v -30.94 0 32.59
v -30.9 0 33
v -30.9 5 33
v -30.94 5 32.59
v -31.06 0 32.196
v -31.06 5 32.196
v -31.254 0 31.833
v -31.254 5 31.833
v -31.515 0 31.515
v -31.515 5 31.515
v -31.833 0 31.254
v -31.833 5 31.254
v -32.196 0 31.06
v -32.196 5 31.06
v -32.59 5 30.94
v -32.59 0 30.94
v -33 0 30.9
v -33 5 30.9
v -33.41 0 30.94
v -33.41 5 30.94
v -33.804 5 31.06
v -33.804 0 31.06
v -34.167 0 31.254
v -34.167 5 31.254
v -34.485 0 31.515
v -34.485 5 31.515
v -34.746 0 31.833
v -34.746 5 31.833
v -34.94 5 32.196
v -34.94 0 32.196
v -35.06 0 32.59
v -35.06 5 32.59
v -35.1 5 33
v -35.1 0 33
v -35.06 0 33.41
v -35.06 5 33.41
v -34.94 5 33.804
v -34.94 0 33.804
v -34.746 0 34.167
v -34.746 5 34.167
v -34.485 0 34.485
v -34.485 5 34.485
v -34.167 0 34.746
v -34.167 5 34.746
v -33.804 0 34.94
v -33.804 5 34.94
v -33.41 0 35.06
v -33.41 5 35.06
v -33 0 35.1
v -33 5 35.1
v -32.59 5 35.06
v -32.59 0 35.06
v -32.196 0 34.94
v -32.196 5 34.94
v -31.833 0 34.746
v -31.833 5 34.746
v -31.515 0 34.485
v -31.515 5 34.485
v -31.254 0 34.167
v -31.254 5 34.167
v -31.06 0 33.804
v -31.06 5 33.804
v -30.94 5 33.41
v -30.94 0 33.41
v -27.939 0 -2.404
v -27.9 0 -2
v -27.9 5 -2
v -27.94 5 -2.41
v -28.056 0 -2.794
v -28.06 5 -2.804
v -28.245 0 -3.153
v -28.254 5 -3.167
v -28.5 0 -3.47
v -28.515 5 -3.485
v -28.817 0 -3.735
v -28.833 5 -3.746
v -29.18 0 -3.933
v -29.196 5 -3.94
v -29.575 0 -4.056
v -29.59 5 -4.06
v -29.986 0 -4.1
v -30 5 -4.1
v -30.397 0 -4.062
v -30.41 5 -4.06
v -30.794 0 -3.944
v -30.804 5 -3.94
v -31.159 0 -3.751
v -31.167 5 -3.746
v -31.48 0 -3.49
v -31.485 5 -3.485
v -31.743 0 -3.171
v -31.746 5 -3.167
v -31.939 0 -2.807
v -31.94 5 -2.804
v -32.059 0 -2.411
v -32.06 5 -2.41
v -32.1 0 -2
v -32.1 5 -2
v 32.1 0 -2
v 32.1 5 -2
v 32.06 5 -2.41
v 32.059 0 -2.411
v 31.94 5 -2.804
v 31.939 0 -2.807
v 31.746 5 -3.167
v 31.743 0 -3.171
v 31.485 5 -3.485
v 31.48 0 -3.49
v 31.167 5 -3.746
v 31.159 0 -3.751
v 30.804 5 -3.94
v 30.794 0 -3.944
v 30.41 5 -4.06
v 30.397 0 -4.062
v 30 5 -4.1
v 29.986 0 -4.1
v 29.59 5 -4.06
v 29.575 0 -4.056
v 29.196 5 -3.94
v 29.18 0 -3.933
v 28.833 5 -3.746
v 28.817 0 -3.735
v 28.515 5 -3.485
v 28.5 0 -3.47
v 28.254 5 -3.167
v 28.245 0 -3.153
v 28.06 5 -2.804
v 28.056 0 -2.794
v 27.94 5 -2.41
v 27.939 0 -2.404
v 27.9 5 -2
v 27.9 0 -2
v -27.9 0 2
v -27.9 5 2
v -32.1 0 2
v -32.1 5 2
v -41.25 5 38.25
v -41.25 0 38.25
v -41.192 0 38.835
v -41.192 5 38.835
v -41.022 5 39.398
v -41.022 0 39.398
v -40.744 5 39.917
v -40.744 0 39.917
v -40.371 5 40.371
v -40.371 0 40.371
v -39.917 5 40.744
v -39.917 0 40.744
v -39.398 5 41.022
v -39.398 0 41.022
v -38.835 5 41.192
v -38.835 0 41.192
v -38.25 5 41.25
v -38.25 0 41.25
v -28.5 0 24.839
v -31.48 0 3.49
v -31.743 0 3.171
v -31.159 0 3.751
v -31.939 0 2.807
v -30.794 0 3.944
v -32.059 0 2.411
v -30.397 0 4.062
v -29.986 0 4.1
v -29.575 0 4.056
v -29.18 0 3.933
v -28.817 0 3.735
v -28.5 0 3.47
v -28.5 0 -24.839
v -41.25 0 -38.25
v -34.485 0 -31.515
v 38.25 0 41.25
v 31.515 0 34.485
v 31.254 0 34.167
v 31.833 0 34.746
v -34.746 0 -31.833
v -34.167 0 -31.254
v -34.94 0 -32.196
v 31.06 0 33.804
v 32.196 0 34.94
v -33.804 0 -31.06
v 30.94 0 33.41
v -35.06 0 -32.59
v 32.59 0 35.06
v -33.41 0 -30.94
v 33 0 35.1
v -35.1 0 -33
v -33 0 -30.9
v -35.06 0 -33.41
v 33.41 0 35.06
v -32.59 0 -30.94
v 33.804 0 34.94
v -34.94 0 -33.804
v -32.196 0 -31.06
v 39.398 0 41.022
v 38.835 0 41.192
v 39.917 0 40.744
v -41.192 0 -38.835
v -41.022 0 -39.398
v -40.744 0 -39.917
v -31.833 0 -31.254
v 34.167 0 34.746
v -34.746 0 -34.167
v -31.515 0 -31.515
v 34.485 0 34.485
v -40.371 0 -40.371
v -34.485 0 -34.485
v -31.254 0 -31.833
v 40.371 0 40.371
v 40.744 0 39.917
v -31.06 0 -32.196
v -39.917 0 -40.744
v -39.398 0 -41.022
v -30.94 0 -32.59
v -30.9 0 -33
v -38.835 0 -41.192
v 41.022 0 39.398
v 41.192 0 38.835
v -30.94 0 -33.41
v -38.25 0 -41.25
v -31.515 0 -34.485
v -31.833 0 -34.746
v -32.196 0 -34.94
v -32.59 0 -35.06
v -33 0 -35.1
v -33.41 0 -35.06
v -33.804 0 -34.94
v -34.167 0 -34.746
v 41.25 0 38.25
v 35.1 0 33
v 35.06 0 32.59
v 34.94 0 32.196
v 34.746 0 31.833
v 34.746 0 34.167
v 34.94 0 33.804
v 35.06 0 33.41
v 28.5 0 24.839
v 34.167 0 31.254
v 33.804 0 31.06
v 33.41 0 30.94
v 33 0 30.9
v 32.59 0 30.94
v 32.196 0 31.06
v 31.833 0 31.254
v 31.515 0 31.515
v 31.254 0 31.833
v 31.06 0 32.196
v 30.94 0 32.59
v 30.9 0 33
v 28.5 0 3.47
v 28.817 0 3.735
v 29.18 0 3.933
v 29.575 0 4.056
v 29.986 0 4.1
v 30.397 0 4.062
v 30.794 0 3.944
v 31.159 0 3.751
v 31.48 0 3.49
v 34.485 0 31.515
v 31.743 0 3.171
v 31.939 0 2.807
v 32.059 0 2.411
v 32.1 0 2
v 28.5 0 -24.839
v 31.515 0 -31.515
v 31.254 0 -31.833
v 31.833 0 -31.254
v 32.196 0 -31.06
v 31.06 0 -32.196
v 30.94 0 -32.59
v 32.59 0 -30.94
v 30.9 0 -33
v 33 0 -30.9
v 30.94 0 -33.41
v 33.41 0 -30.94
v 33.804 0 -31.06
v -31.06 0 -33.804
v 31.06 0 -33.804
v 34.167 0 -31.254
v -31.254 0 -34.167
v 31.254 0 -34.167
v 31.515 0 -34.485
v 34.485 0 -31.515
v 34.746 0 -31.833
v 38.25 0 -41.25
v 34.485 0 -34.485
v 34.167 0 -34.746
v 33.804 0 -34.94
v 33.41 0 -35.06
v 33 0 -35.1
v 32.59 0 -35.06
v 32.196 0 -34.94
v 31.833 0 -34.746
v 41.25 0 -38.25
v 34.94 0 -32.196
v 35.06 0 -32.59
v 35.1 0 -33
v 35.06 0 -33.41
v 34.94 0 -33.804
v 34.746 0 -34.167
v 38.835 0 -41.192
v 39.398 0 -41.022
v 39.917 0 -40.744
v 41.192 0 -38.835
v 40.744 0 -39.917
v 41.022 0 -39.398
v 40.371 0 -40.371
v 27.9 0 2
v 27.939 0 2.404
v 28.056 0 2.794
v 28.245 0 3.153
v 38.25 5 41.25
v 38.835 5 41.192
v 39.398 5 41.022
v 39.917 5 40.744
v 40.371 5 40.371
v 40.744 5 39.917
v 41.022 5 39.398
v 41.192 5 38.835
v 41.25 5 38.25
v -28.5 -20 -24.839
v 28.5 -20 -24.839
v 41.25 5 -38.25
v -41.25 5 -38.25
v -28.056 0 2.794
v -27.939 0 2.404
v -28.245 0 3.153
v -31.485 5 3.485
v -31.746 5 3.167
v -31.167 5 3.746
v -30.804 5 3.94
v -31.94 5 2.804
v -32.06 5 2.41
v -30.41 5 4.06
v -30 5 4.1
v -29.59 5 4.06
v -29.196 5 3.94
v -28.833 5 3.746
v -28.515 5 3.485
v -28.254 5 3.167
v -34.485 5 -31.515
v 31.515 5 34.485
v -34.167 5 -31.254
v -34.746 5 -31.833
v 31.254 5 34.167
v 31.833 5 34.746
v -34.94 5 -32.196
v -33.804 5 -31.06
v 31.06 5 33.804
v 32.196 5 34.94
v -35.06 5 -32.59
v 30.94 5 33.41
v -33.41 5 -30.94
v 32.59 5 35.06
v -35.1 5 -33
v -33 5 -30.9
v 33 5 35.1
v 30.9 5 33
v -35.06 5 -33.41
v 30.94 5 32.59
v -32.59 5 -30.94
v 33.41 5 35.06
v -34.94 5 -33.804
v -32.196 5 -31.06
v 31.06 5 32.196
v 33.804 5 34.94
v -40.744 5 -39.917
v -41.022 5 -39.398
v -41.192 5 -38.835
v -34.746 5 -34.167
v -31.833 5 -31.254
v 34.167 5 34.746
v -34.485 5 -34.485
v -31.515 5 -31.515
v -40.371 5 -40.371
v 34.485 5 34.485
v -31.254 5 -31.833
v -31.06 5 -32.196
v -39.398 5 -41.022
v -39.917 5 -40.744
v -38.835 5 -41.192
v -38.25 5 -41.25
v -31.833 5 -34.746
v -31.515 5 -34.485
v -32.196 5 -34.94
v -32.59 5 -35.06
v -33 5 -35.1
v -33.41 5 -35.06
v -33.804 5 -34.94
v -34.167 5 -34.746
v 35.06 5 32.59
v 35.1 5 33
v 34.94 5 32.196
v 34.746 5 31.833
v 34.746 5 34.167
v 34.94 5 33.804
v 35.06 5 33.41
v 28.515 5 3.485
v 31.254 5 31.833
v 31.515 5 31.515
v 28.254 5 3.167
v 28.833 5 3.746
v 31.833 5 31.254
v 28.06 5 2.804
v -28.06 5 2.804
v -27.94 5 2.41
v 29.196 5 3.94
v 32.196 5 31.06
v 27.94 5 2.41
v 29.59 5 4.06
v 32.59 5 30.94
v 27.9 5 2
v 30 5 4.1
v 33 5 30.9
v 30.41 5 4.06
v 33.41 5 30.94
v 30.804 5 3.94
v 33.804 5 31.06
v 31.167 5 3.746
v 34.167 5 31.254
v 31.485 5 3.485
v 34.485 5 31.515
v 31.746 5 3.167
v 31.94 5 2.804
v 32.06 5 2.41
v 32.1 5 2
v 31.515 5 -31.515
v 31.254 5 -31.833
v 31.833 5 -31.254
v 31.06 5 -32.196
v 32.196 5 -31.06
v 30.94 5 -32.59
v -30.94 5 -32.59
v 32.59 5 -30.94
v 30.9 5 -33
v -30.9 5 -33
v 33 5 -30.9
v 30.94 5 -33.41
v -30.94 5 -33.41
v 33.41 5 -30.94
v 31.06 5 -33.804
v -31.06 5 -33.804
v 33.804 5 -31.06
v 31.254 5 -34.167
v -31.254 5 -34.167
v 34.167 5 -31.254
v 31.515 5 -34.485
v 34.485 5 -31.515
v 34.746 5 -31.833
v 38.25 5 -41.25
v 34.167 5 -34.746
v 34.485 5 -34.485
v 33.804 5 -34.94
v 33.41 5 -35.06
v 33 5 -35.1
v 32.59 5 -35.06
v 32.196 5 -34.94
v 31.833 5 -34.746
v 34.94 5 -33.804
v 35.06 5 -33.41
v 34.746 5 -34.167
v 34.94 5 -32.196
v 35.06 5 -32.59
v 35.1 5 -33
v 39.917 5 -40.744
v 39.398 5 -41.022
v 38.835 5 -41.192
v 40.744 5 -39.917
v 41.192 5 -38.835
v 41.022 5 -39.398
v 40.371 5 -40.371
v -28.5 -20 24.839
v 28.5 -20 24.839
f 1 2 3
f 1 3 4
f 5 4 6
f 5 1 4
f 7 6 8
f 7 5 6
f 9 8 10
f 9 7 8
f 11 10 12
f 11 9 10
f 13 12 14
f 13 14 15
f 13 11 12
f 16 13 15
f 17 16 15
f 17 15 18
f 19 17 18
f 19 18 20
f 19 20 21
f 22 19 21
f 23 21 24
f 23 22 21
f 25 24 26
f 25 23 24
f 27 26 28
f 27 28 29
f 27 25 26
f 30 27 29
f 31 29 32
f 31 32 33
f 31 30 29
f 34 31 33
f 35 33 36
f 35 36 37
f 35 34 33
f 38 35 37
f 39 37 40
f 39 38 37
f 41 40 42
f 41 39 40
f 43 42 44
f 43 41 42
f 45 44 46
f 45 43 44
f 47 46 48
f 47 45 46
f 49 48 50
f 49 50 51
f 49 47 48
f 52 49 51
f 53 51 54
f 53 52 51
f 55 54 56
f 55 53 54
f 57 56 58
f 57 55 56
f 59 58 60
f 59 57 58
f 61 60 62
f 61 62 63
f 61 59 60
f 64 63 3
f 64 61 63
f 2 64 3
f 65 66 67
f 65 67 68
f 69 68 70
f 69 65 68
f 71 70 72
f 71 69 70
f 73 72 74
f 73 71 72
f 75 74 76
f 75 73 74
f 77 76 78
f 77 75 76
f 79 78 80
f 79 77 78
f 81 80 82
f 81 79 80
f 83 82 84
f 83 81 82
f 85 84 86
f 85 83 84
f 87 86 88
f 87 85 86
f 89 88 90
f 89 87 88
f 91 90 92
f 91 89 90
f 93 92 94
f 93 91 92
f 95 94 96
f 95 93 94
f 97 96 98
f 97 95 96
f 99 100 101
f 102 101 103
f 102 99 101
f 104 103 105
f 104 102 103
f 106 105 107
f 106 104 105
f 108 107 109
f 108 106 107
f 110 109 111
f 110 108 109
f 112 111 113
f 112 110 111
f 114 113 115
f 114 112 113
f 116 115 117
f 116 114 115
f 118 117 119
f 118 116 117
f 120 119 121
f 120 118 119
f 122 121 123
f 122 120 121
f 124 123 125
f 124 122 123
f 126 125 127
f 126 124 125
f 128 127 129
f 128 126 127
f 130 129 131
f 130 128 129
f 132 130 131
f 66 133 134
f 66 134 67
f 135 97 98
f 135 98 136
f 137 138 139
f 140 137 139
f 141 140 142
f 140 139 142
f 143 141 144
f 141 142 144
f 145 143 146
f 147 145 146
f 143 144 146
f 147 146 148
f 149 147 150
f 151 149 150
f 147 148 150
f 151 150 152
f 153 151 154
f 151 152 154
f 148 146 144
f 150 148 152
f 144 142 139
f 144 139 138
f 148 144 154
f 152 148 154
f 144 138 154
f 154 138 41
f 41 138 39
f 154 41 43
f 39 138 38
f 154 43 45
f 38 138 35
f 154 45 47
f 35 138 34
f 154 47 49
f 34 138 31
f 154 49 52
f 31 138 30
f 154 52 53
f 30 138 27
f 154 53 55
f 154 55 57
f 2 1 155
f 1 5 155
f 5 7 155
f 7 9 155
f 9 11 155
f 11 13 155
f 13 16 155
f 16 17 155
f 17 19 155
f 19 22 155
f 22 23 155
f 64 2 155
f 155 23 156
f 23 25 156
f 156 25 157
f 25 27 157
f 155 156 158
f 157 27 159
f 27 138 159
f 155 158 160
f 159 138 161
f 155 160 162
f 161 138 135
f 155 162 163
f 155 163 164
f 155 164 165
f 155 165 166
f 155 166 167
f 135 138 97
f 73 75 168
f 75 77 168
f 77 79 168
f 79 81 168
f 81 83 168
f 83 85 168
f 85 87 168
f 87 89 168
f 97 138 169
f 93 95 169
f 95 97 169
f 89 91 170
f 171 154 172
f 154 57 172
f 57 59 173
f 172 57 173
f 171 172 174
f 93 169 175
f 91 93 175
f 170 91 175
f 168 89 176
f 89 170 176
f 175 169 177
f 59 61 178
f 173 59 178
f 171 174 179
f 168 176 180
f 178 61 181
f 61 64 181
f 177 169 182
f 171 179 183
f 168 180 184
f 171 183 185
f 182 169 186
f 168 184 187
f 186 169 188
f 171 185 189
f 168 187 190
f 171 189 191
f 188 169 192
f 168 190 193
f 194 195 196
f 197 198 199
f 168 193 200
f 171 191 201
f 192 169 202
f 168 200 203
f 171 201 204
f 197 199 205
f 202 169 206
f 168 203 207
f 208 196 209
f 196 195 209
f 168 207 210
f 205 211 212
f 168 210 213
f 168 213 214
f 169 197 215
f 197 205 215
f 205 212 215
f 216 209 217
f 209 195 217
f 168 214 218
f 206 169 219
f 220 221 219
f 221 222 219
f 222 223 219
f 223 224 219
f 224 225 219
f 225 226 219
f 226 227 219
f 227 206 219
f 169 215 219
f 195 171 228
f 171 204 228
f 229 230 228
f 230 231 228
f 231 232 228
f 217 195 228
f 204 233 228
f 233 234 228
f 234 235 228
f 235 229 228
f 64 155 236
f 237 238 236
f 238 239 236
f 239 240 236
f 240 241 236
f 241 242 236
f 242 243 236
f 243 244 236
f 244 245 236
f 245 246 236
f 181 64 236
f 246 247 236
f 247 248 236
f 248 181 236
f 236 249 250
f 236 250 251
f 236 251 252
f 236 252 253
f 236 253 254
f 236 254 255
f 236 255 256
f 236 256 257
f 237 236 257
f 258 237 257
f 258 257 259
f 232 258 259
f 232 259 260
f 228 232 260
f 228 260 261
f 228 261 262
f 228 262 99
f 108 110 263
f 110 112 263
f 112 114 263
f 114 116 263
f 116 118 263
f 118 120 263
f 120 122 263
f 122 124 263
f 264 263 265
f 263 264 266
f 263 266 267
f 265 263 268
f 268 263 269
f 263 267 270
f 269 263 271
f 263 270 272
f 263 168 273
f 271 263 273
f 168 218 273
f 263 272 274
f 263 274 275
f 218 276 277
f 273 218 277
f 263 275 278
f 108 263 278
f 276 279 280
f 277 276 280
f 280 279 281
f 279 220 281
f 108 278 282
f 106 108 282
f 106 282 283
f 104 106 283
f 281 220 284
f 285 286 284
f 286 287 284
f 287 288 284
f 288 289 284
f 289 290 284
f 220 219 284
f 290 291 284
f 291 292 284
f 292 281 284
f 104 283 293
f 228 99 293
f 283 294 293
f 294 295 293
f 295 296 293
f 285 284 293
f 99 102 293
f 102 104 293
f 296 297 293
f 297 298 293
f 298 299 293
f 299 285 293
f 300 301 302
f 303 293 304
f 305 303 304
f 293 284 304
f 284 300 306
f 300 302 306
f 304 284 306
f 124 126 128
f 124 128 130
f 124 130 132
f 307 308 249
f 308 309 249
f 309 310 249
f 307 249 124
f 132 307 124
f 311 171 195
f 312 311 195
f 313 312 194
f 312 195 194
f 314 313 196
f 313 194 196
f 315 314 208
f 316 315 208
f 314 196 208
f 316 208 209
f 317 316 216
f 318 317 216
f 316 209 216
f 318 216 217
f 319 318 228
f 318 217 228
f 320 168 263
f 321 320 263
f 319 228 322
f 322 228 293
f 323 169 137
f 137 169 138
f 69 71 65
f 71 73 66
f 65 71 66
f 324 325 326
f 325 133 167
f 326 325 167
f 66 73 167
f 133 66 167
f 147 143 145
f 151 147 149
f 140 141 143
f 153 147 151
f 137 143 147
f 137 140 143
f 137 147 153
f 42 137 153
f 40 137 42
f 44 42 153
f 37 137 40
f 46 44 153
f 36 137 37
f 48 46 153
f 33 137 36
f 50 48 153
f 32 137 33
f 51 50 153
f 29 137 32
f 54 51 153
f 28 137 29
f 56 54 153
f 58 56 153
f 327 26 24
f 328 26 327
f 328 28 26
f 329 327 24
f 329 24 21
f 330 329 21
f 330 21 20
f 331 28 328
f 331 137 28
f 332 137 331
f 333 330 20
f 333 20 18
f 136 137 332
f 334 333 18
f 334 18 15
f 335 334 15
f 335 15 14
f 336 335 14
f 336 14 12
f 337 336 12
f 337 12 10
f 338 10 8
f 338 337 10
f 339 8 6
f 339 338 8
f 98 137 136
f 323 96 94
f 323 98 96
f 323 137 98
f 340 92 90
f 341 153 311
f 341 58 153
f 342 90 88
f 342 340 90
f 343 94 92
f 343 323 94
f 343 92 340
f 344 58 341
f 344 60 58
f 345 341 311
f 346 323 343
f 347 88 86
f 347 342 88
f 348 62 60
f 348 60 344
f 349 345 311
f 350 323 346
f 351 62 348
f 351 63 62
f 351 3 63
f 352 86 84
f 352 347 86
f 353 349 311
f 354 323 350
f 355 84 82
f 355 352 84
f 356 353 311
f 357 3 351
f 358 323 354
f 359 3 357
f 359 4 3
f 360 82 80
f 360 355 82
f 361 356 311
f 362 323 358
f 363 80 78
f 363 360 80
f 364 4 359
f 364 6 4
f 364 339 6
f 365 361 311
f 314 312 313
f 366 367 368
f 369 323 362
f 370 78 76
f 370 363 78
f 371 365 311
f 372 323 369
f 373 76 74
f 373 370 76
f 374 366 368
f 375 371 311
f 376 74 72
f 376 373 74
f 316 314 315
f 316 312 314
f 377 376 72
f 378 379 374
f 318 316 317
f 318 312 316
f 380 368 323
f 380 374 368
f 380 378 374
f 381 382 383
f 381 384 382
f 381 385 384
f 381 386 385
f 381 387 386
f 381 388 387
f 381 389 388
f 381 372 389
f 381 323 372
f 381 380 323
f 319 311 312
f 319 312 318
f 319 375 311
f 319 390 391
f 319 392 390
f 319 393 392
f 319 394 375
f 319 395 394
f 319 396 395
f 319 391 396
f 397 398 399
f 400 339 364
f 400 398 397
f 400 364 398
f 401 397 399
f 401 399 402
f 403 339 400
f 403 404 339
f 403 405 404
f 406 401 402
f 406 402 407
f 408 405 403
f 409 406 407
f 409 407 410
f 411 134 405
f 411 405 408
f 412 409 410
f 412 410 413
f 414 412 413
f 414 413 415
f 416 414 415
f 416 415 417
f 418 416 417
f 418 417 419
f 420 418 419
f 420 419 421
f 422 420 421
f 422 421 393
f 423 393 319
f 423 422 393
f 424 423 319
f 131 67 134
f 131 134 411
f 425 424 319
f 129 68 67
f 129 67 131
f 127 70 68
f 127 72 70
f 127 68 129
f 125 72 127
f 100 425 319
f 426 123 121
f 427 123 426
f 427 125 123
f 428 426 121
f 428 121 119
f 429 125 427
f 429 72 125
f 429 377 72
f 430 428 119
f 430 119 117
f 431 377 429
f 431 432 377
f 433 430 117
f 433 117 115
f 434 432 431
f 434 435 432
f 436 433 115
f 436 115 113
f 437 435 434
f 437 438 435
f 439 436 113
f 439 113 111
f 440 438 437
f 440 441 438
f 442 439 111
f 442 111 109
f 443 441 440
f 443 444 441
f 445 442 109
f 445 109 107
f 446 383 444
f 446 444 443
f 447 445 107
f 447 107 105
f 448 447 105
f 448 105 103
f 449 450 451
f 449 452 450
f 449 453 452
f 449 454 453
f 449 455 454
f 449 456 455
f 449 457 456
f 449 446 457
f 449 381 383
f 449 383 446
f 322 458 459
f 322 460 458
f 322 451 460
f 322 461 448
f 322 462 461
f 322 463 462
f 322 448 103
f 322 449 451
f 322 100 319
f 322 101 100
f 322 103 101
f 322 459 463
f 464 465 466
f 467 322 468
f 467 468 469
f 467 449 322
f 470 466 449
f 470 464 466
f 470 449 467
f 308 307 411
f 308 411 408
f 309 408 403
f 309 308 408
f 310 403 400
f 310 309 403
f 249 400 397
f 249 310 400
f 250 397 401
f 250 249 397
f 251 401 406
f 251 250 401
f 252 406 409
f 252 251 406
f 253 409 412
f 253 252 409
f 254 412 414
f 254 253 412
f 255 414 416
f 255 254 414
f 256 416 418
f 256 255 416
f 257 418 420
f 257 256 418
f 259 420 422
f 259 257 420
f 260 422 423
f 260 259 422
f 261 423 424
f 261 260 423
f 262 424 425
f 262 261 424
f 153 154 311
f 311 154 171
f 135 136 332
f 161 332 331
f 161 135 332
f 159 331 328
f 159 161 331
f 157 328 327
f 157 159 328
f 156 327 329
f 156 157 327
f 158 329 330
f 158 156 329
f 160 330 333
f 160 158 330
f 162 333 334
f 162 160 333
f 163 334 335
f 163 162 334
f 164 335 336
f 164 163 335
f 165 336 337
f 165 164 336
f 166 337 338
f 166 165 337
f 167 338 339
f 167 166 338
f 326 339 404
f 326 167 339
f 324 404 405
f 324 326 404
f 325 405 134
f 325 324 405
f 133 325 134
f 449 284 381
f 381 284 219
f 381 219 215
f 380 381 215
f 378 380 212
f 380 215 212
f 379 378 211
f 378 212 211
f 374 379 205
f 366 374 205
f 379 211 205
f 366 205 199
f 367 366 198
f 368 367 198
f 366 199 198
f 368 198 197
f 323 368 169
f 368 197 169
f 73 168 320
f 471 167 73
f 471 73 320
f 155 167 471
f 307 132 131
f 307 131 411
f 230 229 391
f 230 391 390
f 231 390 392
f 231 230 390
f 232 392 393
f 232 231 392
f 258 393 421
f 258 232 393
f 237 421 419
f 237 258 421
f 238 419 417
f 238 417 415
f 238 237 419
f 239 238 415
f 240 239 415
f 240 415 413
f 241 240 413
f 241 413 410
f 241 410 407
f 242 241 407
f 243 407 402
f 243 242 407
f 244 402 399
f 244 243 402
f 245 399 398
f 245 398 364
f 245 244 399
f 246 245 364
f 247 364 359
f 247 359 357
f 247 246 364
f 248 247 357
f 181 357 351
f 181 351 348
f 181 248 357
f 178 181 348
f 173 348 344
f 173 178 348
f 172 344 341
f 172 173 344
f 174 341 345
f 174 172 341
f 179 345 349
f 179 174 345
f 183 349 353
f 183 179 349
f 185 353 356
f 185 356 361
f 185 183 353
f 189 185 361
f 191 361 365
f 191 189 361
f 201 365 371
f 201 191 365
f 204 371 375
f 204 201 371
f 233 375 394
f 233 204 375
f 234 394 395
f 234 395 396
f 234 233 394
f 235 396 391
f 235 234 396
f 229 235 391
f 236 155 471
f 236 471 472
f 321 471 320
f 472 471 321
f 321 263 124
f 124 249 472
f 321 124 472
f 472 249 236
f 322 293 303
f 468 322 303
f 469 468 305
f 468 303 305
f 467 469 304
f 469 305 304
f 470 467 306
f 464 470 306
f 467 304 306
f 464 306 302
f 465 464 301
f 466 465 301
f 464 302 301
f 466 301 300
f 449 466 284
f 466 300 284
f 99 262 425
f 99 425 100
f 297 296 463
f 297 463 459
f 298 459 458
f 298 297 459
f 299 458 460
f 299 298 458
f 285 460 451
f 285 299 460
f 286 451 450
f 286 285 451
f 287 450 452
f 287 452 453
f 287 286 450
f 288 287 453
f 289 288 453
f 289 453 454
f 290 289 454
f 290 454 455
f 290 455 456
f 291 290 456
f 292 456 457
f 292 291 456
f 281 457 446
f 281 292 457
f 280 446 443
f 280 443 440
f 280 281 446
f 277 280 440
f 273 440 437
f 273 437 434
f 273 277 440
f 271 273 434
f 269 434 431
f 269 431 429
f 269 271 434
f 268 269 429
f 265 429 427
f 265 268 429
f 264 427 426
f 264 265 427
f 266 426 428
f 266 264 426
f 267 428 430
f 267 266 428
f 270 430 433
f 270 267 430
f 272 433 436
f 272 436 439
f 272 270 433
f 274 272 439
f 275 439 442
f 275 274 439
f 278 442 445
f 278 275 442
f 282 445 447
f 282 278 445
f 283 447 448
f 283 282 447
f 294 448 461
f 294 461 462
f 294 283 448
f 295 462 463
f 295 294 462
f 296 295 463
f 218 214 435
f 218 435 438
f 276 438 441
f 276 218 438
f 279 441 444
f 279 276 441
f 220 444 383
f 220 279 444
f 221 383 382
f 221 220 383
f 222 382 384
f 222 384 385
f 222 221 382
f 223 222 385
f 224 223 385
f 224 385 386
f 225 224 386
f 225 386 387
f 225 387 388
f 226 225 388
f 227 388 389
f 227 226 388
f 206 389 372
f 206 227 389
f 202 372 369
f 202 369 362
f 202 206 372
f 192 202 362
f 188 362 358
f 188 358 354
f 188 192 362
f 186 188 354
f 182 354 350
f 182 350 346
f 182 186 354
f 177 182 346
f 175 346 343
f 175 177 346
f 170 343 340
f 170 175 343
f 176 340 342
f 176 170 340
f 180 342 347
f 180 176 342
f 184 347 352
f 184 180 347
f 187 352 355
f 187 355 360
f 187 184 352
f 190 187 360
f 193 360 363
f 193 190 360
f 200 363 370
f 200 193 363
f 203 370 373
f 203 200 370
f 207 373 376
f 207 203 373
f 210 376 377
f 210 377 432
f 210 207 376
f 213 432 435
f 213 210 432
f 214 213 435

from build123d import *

# Parameters (mm, degrees)
SKETCH_1_R      = 2.1
EXTRUDE_1_DEPTH = 5
SKETCH_2_W      = 57
SKETCH_2_H      = 49.677447992
EXTRUDE_2_DEPTH = 20


with BuildPart() as part:
    # Эскиз1 → Бобышка-Вытянуть1 (new body)
    with BuildSketch(Plane(origin=(0, 0, 0), x_dir=(1, 0, 0), z_dir=(0, 1, 0))):
        with BuildLine():
            Line((-38.25, -41.25), (38.25, -41.25))
            ThreePointArc((38.25, -41.25), (40.371320344, -40.371320344), (41.25, -38.25))
            Line((41.25, -38.25), (41.25, 38.25))
            ThreePointArc((41.25, 38.25), (40.371320344, 40.371320344), (38.25, 41.25))
            Line((38.25, 41.25), (-38.25, 41.25))
            ThreePointArc((-38.25, 41.25), (-40.371320344, 40.371320344), (-41.25, 38.25))
            Line((-41.25, 38.25), (-41.25, -38.25))
            ThreePointArc((-41.25, -38.25), (-40.371320344, -40.371320344), (-38.25, -41.25))
        make_face()
        with Locations((-33, 33)):
            Circle(SKETCH_1_R, mode=Mode.SUBTRACT)
        with Locations((33, 33)):
            Circle(SKETCH_1_R, mode=Mode.SUBTRACT)
        with Locations((33, -33)):
            Circle(SKETCH_1_R, mode=Mode.SUBTRACT)
        with Locations((-33, -33)):
            Circle(SKETCH_1_R, mode=Mode.SUBTRACT)
        with BuildLine():
            Line((-32.1, 2), (-32.1, -2))
            ThreePointArc((-32.1, -2), (-30, -4.1), (-27.9, -2))
            Line((-27.9, -2), (-27.9, 2))
            ThreePointArc((-27.9, 2), (-30, 4.1), (-32.1, 2))
        make_face(mode=Mode.SUBTRACT)
        with BuildLine():
            Line((32.1, -2), (32.1, 2))
            ThreePointArc((32.1, 2), (30, 4.1), (27.9, 2))
            Line((27.9, 2), (27.9, -2))
            ThreePointArc((27.9, -2), (30, -4.1), (32.1, -2))
        make_face(mode=Mode.SUBTRACT)
    extrude(amount=EXTRUDE_1_DEPTH)

    # Эскиз2 → Бобышка-Вытянуть2 (add)
    with BuildSketch(Plane.XZ):
        Rectangle(SKETCH_2_W, SKETCH_2_H)
    extrude(amount=EXTRUDE_2_DEPTH)


solid = part.part
